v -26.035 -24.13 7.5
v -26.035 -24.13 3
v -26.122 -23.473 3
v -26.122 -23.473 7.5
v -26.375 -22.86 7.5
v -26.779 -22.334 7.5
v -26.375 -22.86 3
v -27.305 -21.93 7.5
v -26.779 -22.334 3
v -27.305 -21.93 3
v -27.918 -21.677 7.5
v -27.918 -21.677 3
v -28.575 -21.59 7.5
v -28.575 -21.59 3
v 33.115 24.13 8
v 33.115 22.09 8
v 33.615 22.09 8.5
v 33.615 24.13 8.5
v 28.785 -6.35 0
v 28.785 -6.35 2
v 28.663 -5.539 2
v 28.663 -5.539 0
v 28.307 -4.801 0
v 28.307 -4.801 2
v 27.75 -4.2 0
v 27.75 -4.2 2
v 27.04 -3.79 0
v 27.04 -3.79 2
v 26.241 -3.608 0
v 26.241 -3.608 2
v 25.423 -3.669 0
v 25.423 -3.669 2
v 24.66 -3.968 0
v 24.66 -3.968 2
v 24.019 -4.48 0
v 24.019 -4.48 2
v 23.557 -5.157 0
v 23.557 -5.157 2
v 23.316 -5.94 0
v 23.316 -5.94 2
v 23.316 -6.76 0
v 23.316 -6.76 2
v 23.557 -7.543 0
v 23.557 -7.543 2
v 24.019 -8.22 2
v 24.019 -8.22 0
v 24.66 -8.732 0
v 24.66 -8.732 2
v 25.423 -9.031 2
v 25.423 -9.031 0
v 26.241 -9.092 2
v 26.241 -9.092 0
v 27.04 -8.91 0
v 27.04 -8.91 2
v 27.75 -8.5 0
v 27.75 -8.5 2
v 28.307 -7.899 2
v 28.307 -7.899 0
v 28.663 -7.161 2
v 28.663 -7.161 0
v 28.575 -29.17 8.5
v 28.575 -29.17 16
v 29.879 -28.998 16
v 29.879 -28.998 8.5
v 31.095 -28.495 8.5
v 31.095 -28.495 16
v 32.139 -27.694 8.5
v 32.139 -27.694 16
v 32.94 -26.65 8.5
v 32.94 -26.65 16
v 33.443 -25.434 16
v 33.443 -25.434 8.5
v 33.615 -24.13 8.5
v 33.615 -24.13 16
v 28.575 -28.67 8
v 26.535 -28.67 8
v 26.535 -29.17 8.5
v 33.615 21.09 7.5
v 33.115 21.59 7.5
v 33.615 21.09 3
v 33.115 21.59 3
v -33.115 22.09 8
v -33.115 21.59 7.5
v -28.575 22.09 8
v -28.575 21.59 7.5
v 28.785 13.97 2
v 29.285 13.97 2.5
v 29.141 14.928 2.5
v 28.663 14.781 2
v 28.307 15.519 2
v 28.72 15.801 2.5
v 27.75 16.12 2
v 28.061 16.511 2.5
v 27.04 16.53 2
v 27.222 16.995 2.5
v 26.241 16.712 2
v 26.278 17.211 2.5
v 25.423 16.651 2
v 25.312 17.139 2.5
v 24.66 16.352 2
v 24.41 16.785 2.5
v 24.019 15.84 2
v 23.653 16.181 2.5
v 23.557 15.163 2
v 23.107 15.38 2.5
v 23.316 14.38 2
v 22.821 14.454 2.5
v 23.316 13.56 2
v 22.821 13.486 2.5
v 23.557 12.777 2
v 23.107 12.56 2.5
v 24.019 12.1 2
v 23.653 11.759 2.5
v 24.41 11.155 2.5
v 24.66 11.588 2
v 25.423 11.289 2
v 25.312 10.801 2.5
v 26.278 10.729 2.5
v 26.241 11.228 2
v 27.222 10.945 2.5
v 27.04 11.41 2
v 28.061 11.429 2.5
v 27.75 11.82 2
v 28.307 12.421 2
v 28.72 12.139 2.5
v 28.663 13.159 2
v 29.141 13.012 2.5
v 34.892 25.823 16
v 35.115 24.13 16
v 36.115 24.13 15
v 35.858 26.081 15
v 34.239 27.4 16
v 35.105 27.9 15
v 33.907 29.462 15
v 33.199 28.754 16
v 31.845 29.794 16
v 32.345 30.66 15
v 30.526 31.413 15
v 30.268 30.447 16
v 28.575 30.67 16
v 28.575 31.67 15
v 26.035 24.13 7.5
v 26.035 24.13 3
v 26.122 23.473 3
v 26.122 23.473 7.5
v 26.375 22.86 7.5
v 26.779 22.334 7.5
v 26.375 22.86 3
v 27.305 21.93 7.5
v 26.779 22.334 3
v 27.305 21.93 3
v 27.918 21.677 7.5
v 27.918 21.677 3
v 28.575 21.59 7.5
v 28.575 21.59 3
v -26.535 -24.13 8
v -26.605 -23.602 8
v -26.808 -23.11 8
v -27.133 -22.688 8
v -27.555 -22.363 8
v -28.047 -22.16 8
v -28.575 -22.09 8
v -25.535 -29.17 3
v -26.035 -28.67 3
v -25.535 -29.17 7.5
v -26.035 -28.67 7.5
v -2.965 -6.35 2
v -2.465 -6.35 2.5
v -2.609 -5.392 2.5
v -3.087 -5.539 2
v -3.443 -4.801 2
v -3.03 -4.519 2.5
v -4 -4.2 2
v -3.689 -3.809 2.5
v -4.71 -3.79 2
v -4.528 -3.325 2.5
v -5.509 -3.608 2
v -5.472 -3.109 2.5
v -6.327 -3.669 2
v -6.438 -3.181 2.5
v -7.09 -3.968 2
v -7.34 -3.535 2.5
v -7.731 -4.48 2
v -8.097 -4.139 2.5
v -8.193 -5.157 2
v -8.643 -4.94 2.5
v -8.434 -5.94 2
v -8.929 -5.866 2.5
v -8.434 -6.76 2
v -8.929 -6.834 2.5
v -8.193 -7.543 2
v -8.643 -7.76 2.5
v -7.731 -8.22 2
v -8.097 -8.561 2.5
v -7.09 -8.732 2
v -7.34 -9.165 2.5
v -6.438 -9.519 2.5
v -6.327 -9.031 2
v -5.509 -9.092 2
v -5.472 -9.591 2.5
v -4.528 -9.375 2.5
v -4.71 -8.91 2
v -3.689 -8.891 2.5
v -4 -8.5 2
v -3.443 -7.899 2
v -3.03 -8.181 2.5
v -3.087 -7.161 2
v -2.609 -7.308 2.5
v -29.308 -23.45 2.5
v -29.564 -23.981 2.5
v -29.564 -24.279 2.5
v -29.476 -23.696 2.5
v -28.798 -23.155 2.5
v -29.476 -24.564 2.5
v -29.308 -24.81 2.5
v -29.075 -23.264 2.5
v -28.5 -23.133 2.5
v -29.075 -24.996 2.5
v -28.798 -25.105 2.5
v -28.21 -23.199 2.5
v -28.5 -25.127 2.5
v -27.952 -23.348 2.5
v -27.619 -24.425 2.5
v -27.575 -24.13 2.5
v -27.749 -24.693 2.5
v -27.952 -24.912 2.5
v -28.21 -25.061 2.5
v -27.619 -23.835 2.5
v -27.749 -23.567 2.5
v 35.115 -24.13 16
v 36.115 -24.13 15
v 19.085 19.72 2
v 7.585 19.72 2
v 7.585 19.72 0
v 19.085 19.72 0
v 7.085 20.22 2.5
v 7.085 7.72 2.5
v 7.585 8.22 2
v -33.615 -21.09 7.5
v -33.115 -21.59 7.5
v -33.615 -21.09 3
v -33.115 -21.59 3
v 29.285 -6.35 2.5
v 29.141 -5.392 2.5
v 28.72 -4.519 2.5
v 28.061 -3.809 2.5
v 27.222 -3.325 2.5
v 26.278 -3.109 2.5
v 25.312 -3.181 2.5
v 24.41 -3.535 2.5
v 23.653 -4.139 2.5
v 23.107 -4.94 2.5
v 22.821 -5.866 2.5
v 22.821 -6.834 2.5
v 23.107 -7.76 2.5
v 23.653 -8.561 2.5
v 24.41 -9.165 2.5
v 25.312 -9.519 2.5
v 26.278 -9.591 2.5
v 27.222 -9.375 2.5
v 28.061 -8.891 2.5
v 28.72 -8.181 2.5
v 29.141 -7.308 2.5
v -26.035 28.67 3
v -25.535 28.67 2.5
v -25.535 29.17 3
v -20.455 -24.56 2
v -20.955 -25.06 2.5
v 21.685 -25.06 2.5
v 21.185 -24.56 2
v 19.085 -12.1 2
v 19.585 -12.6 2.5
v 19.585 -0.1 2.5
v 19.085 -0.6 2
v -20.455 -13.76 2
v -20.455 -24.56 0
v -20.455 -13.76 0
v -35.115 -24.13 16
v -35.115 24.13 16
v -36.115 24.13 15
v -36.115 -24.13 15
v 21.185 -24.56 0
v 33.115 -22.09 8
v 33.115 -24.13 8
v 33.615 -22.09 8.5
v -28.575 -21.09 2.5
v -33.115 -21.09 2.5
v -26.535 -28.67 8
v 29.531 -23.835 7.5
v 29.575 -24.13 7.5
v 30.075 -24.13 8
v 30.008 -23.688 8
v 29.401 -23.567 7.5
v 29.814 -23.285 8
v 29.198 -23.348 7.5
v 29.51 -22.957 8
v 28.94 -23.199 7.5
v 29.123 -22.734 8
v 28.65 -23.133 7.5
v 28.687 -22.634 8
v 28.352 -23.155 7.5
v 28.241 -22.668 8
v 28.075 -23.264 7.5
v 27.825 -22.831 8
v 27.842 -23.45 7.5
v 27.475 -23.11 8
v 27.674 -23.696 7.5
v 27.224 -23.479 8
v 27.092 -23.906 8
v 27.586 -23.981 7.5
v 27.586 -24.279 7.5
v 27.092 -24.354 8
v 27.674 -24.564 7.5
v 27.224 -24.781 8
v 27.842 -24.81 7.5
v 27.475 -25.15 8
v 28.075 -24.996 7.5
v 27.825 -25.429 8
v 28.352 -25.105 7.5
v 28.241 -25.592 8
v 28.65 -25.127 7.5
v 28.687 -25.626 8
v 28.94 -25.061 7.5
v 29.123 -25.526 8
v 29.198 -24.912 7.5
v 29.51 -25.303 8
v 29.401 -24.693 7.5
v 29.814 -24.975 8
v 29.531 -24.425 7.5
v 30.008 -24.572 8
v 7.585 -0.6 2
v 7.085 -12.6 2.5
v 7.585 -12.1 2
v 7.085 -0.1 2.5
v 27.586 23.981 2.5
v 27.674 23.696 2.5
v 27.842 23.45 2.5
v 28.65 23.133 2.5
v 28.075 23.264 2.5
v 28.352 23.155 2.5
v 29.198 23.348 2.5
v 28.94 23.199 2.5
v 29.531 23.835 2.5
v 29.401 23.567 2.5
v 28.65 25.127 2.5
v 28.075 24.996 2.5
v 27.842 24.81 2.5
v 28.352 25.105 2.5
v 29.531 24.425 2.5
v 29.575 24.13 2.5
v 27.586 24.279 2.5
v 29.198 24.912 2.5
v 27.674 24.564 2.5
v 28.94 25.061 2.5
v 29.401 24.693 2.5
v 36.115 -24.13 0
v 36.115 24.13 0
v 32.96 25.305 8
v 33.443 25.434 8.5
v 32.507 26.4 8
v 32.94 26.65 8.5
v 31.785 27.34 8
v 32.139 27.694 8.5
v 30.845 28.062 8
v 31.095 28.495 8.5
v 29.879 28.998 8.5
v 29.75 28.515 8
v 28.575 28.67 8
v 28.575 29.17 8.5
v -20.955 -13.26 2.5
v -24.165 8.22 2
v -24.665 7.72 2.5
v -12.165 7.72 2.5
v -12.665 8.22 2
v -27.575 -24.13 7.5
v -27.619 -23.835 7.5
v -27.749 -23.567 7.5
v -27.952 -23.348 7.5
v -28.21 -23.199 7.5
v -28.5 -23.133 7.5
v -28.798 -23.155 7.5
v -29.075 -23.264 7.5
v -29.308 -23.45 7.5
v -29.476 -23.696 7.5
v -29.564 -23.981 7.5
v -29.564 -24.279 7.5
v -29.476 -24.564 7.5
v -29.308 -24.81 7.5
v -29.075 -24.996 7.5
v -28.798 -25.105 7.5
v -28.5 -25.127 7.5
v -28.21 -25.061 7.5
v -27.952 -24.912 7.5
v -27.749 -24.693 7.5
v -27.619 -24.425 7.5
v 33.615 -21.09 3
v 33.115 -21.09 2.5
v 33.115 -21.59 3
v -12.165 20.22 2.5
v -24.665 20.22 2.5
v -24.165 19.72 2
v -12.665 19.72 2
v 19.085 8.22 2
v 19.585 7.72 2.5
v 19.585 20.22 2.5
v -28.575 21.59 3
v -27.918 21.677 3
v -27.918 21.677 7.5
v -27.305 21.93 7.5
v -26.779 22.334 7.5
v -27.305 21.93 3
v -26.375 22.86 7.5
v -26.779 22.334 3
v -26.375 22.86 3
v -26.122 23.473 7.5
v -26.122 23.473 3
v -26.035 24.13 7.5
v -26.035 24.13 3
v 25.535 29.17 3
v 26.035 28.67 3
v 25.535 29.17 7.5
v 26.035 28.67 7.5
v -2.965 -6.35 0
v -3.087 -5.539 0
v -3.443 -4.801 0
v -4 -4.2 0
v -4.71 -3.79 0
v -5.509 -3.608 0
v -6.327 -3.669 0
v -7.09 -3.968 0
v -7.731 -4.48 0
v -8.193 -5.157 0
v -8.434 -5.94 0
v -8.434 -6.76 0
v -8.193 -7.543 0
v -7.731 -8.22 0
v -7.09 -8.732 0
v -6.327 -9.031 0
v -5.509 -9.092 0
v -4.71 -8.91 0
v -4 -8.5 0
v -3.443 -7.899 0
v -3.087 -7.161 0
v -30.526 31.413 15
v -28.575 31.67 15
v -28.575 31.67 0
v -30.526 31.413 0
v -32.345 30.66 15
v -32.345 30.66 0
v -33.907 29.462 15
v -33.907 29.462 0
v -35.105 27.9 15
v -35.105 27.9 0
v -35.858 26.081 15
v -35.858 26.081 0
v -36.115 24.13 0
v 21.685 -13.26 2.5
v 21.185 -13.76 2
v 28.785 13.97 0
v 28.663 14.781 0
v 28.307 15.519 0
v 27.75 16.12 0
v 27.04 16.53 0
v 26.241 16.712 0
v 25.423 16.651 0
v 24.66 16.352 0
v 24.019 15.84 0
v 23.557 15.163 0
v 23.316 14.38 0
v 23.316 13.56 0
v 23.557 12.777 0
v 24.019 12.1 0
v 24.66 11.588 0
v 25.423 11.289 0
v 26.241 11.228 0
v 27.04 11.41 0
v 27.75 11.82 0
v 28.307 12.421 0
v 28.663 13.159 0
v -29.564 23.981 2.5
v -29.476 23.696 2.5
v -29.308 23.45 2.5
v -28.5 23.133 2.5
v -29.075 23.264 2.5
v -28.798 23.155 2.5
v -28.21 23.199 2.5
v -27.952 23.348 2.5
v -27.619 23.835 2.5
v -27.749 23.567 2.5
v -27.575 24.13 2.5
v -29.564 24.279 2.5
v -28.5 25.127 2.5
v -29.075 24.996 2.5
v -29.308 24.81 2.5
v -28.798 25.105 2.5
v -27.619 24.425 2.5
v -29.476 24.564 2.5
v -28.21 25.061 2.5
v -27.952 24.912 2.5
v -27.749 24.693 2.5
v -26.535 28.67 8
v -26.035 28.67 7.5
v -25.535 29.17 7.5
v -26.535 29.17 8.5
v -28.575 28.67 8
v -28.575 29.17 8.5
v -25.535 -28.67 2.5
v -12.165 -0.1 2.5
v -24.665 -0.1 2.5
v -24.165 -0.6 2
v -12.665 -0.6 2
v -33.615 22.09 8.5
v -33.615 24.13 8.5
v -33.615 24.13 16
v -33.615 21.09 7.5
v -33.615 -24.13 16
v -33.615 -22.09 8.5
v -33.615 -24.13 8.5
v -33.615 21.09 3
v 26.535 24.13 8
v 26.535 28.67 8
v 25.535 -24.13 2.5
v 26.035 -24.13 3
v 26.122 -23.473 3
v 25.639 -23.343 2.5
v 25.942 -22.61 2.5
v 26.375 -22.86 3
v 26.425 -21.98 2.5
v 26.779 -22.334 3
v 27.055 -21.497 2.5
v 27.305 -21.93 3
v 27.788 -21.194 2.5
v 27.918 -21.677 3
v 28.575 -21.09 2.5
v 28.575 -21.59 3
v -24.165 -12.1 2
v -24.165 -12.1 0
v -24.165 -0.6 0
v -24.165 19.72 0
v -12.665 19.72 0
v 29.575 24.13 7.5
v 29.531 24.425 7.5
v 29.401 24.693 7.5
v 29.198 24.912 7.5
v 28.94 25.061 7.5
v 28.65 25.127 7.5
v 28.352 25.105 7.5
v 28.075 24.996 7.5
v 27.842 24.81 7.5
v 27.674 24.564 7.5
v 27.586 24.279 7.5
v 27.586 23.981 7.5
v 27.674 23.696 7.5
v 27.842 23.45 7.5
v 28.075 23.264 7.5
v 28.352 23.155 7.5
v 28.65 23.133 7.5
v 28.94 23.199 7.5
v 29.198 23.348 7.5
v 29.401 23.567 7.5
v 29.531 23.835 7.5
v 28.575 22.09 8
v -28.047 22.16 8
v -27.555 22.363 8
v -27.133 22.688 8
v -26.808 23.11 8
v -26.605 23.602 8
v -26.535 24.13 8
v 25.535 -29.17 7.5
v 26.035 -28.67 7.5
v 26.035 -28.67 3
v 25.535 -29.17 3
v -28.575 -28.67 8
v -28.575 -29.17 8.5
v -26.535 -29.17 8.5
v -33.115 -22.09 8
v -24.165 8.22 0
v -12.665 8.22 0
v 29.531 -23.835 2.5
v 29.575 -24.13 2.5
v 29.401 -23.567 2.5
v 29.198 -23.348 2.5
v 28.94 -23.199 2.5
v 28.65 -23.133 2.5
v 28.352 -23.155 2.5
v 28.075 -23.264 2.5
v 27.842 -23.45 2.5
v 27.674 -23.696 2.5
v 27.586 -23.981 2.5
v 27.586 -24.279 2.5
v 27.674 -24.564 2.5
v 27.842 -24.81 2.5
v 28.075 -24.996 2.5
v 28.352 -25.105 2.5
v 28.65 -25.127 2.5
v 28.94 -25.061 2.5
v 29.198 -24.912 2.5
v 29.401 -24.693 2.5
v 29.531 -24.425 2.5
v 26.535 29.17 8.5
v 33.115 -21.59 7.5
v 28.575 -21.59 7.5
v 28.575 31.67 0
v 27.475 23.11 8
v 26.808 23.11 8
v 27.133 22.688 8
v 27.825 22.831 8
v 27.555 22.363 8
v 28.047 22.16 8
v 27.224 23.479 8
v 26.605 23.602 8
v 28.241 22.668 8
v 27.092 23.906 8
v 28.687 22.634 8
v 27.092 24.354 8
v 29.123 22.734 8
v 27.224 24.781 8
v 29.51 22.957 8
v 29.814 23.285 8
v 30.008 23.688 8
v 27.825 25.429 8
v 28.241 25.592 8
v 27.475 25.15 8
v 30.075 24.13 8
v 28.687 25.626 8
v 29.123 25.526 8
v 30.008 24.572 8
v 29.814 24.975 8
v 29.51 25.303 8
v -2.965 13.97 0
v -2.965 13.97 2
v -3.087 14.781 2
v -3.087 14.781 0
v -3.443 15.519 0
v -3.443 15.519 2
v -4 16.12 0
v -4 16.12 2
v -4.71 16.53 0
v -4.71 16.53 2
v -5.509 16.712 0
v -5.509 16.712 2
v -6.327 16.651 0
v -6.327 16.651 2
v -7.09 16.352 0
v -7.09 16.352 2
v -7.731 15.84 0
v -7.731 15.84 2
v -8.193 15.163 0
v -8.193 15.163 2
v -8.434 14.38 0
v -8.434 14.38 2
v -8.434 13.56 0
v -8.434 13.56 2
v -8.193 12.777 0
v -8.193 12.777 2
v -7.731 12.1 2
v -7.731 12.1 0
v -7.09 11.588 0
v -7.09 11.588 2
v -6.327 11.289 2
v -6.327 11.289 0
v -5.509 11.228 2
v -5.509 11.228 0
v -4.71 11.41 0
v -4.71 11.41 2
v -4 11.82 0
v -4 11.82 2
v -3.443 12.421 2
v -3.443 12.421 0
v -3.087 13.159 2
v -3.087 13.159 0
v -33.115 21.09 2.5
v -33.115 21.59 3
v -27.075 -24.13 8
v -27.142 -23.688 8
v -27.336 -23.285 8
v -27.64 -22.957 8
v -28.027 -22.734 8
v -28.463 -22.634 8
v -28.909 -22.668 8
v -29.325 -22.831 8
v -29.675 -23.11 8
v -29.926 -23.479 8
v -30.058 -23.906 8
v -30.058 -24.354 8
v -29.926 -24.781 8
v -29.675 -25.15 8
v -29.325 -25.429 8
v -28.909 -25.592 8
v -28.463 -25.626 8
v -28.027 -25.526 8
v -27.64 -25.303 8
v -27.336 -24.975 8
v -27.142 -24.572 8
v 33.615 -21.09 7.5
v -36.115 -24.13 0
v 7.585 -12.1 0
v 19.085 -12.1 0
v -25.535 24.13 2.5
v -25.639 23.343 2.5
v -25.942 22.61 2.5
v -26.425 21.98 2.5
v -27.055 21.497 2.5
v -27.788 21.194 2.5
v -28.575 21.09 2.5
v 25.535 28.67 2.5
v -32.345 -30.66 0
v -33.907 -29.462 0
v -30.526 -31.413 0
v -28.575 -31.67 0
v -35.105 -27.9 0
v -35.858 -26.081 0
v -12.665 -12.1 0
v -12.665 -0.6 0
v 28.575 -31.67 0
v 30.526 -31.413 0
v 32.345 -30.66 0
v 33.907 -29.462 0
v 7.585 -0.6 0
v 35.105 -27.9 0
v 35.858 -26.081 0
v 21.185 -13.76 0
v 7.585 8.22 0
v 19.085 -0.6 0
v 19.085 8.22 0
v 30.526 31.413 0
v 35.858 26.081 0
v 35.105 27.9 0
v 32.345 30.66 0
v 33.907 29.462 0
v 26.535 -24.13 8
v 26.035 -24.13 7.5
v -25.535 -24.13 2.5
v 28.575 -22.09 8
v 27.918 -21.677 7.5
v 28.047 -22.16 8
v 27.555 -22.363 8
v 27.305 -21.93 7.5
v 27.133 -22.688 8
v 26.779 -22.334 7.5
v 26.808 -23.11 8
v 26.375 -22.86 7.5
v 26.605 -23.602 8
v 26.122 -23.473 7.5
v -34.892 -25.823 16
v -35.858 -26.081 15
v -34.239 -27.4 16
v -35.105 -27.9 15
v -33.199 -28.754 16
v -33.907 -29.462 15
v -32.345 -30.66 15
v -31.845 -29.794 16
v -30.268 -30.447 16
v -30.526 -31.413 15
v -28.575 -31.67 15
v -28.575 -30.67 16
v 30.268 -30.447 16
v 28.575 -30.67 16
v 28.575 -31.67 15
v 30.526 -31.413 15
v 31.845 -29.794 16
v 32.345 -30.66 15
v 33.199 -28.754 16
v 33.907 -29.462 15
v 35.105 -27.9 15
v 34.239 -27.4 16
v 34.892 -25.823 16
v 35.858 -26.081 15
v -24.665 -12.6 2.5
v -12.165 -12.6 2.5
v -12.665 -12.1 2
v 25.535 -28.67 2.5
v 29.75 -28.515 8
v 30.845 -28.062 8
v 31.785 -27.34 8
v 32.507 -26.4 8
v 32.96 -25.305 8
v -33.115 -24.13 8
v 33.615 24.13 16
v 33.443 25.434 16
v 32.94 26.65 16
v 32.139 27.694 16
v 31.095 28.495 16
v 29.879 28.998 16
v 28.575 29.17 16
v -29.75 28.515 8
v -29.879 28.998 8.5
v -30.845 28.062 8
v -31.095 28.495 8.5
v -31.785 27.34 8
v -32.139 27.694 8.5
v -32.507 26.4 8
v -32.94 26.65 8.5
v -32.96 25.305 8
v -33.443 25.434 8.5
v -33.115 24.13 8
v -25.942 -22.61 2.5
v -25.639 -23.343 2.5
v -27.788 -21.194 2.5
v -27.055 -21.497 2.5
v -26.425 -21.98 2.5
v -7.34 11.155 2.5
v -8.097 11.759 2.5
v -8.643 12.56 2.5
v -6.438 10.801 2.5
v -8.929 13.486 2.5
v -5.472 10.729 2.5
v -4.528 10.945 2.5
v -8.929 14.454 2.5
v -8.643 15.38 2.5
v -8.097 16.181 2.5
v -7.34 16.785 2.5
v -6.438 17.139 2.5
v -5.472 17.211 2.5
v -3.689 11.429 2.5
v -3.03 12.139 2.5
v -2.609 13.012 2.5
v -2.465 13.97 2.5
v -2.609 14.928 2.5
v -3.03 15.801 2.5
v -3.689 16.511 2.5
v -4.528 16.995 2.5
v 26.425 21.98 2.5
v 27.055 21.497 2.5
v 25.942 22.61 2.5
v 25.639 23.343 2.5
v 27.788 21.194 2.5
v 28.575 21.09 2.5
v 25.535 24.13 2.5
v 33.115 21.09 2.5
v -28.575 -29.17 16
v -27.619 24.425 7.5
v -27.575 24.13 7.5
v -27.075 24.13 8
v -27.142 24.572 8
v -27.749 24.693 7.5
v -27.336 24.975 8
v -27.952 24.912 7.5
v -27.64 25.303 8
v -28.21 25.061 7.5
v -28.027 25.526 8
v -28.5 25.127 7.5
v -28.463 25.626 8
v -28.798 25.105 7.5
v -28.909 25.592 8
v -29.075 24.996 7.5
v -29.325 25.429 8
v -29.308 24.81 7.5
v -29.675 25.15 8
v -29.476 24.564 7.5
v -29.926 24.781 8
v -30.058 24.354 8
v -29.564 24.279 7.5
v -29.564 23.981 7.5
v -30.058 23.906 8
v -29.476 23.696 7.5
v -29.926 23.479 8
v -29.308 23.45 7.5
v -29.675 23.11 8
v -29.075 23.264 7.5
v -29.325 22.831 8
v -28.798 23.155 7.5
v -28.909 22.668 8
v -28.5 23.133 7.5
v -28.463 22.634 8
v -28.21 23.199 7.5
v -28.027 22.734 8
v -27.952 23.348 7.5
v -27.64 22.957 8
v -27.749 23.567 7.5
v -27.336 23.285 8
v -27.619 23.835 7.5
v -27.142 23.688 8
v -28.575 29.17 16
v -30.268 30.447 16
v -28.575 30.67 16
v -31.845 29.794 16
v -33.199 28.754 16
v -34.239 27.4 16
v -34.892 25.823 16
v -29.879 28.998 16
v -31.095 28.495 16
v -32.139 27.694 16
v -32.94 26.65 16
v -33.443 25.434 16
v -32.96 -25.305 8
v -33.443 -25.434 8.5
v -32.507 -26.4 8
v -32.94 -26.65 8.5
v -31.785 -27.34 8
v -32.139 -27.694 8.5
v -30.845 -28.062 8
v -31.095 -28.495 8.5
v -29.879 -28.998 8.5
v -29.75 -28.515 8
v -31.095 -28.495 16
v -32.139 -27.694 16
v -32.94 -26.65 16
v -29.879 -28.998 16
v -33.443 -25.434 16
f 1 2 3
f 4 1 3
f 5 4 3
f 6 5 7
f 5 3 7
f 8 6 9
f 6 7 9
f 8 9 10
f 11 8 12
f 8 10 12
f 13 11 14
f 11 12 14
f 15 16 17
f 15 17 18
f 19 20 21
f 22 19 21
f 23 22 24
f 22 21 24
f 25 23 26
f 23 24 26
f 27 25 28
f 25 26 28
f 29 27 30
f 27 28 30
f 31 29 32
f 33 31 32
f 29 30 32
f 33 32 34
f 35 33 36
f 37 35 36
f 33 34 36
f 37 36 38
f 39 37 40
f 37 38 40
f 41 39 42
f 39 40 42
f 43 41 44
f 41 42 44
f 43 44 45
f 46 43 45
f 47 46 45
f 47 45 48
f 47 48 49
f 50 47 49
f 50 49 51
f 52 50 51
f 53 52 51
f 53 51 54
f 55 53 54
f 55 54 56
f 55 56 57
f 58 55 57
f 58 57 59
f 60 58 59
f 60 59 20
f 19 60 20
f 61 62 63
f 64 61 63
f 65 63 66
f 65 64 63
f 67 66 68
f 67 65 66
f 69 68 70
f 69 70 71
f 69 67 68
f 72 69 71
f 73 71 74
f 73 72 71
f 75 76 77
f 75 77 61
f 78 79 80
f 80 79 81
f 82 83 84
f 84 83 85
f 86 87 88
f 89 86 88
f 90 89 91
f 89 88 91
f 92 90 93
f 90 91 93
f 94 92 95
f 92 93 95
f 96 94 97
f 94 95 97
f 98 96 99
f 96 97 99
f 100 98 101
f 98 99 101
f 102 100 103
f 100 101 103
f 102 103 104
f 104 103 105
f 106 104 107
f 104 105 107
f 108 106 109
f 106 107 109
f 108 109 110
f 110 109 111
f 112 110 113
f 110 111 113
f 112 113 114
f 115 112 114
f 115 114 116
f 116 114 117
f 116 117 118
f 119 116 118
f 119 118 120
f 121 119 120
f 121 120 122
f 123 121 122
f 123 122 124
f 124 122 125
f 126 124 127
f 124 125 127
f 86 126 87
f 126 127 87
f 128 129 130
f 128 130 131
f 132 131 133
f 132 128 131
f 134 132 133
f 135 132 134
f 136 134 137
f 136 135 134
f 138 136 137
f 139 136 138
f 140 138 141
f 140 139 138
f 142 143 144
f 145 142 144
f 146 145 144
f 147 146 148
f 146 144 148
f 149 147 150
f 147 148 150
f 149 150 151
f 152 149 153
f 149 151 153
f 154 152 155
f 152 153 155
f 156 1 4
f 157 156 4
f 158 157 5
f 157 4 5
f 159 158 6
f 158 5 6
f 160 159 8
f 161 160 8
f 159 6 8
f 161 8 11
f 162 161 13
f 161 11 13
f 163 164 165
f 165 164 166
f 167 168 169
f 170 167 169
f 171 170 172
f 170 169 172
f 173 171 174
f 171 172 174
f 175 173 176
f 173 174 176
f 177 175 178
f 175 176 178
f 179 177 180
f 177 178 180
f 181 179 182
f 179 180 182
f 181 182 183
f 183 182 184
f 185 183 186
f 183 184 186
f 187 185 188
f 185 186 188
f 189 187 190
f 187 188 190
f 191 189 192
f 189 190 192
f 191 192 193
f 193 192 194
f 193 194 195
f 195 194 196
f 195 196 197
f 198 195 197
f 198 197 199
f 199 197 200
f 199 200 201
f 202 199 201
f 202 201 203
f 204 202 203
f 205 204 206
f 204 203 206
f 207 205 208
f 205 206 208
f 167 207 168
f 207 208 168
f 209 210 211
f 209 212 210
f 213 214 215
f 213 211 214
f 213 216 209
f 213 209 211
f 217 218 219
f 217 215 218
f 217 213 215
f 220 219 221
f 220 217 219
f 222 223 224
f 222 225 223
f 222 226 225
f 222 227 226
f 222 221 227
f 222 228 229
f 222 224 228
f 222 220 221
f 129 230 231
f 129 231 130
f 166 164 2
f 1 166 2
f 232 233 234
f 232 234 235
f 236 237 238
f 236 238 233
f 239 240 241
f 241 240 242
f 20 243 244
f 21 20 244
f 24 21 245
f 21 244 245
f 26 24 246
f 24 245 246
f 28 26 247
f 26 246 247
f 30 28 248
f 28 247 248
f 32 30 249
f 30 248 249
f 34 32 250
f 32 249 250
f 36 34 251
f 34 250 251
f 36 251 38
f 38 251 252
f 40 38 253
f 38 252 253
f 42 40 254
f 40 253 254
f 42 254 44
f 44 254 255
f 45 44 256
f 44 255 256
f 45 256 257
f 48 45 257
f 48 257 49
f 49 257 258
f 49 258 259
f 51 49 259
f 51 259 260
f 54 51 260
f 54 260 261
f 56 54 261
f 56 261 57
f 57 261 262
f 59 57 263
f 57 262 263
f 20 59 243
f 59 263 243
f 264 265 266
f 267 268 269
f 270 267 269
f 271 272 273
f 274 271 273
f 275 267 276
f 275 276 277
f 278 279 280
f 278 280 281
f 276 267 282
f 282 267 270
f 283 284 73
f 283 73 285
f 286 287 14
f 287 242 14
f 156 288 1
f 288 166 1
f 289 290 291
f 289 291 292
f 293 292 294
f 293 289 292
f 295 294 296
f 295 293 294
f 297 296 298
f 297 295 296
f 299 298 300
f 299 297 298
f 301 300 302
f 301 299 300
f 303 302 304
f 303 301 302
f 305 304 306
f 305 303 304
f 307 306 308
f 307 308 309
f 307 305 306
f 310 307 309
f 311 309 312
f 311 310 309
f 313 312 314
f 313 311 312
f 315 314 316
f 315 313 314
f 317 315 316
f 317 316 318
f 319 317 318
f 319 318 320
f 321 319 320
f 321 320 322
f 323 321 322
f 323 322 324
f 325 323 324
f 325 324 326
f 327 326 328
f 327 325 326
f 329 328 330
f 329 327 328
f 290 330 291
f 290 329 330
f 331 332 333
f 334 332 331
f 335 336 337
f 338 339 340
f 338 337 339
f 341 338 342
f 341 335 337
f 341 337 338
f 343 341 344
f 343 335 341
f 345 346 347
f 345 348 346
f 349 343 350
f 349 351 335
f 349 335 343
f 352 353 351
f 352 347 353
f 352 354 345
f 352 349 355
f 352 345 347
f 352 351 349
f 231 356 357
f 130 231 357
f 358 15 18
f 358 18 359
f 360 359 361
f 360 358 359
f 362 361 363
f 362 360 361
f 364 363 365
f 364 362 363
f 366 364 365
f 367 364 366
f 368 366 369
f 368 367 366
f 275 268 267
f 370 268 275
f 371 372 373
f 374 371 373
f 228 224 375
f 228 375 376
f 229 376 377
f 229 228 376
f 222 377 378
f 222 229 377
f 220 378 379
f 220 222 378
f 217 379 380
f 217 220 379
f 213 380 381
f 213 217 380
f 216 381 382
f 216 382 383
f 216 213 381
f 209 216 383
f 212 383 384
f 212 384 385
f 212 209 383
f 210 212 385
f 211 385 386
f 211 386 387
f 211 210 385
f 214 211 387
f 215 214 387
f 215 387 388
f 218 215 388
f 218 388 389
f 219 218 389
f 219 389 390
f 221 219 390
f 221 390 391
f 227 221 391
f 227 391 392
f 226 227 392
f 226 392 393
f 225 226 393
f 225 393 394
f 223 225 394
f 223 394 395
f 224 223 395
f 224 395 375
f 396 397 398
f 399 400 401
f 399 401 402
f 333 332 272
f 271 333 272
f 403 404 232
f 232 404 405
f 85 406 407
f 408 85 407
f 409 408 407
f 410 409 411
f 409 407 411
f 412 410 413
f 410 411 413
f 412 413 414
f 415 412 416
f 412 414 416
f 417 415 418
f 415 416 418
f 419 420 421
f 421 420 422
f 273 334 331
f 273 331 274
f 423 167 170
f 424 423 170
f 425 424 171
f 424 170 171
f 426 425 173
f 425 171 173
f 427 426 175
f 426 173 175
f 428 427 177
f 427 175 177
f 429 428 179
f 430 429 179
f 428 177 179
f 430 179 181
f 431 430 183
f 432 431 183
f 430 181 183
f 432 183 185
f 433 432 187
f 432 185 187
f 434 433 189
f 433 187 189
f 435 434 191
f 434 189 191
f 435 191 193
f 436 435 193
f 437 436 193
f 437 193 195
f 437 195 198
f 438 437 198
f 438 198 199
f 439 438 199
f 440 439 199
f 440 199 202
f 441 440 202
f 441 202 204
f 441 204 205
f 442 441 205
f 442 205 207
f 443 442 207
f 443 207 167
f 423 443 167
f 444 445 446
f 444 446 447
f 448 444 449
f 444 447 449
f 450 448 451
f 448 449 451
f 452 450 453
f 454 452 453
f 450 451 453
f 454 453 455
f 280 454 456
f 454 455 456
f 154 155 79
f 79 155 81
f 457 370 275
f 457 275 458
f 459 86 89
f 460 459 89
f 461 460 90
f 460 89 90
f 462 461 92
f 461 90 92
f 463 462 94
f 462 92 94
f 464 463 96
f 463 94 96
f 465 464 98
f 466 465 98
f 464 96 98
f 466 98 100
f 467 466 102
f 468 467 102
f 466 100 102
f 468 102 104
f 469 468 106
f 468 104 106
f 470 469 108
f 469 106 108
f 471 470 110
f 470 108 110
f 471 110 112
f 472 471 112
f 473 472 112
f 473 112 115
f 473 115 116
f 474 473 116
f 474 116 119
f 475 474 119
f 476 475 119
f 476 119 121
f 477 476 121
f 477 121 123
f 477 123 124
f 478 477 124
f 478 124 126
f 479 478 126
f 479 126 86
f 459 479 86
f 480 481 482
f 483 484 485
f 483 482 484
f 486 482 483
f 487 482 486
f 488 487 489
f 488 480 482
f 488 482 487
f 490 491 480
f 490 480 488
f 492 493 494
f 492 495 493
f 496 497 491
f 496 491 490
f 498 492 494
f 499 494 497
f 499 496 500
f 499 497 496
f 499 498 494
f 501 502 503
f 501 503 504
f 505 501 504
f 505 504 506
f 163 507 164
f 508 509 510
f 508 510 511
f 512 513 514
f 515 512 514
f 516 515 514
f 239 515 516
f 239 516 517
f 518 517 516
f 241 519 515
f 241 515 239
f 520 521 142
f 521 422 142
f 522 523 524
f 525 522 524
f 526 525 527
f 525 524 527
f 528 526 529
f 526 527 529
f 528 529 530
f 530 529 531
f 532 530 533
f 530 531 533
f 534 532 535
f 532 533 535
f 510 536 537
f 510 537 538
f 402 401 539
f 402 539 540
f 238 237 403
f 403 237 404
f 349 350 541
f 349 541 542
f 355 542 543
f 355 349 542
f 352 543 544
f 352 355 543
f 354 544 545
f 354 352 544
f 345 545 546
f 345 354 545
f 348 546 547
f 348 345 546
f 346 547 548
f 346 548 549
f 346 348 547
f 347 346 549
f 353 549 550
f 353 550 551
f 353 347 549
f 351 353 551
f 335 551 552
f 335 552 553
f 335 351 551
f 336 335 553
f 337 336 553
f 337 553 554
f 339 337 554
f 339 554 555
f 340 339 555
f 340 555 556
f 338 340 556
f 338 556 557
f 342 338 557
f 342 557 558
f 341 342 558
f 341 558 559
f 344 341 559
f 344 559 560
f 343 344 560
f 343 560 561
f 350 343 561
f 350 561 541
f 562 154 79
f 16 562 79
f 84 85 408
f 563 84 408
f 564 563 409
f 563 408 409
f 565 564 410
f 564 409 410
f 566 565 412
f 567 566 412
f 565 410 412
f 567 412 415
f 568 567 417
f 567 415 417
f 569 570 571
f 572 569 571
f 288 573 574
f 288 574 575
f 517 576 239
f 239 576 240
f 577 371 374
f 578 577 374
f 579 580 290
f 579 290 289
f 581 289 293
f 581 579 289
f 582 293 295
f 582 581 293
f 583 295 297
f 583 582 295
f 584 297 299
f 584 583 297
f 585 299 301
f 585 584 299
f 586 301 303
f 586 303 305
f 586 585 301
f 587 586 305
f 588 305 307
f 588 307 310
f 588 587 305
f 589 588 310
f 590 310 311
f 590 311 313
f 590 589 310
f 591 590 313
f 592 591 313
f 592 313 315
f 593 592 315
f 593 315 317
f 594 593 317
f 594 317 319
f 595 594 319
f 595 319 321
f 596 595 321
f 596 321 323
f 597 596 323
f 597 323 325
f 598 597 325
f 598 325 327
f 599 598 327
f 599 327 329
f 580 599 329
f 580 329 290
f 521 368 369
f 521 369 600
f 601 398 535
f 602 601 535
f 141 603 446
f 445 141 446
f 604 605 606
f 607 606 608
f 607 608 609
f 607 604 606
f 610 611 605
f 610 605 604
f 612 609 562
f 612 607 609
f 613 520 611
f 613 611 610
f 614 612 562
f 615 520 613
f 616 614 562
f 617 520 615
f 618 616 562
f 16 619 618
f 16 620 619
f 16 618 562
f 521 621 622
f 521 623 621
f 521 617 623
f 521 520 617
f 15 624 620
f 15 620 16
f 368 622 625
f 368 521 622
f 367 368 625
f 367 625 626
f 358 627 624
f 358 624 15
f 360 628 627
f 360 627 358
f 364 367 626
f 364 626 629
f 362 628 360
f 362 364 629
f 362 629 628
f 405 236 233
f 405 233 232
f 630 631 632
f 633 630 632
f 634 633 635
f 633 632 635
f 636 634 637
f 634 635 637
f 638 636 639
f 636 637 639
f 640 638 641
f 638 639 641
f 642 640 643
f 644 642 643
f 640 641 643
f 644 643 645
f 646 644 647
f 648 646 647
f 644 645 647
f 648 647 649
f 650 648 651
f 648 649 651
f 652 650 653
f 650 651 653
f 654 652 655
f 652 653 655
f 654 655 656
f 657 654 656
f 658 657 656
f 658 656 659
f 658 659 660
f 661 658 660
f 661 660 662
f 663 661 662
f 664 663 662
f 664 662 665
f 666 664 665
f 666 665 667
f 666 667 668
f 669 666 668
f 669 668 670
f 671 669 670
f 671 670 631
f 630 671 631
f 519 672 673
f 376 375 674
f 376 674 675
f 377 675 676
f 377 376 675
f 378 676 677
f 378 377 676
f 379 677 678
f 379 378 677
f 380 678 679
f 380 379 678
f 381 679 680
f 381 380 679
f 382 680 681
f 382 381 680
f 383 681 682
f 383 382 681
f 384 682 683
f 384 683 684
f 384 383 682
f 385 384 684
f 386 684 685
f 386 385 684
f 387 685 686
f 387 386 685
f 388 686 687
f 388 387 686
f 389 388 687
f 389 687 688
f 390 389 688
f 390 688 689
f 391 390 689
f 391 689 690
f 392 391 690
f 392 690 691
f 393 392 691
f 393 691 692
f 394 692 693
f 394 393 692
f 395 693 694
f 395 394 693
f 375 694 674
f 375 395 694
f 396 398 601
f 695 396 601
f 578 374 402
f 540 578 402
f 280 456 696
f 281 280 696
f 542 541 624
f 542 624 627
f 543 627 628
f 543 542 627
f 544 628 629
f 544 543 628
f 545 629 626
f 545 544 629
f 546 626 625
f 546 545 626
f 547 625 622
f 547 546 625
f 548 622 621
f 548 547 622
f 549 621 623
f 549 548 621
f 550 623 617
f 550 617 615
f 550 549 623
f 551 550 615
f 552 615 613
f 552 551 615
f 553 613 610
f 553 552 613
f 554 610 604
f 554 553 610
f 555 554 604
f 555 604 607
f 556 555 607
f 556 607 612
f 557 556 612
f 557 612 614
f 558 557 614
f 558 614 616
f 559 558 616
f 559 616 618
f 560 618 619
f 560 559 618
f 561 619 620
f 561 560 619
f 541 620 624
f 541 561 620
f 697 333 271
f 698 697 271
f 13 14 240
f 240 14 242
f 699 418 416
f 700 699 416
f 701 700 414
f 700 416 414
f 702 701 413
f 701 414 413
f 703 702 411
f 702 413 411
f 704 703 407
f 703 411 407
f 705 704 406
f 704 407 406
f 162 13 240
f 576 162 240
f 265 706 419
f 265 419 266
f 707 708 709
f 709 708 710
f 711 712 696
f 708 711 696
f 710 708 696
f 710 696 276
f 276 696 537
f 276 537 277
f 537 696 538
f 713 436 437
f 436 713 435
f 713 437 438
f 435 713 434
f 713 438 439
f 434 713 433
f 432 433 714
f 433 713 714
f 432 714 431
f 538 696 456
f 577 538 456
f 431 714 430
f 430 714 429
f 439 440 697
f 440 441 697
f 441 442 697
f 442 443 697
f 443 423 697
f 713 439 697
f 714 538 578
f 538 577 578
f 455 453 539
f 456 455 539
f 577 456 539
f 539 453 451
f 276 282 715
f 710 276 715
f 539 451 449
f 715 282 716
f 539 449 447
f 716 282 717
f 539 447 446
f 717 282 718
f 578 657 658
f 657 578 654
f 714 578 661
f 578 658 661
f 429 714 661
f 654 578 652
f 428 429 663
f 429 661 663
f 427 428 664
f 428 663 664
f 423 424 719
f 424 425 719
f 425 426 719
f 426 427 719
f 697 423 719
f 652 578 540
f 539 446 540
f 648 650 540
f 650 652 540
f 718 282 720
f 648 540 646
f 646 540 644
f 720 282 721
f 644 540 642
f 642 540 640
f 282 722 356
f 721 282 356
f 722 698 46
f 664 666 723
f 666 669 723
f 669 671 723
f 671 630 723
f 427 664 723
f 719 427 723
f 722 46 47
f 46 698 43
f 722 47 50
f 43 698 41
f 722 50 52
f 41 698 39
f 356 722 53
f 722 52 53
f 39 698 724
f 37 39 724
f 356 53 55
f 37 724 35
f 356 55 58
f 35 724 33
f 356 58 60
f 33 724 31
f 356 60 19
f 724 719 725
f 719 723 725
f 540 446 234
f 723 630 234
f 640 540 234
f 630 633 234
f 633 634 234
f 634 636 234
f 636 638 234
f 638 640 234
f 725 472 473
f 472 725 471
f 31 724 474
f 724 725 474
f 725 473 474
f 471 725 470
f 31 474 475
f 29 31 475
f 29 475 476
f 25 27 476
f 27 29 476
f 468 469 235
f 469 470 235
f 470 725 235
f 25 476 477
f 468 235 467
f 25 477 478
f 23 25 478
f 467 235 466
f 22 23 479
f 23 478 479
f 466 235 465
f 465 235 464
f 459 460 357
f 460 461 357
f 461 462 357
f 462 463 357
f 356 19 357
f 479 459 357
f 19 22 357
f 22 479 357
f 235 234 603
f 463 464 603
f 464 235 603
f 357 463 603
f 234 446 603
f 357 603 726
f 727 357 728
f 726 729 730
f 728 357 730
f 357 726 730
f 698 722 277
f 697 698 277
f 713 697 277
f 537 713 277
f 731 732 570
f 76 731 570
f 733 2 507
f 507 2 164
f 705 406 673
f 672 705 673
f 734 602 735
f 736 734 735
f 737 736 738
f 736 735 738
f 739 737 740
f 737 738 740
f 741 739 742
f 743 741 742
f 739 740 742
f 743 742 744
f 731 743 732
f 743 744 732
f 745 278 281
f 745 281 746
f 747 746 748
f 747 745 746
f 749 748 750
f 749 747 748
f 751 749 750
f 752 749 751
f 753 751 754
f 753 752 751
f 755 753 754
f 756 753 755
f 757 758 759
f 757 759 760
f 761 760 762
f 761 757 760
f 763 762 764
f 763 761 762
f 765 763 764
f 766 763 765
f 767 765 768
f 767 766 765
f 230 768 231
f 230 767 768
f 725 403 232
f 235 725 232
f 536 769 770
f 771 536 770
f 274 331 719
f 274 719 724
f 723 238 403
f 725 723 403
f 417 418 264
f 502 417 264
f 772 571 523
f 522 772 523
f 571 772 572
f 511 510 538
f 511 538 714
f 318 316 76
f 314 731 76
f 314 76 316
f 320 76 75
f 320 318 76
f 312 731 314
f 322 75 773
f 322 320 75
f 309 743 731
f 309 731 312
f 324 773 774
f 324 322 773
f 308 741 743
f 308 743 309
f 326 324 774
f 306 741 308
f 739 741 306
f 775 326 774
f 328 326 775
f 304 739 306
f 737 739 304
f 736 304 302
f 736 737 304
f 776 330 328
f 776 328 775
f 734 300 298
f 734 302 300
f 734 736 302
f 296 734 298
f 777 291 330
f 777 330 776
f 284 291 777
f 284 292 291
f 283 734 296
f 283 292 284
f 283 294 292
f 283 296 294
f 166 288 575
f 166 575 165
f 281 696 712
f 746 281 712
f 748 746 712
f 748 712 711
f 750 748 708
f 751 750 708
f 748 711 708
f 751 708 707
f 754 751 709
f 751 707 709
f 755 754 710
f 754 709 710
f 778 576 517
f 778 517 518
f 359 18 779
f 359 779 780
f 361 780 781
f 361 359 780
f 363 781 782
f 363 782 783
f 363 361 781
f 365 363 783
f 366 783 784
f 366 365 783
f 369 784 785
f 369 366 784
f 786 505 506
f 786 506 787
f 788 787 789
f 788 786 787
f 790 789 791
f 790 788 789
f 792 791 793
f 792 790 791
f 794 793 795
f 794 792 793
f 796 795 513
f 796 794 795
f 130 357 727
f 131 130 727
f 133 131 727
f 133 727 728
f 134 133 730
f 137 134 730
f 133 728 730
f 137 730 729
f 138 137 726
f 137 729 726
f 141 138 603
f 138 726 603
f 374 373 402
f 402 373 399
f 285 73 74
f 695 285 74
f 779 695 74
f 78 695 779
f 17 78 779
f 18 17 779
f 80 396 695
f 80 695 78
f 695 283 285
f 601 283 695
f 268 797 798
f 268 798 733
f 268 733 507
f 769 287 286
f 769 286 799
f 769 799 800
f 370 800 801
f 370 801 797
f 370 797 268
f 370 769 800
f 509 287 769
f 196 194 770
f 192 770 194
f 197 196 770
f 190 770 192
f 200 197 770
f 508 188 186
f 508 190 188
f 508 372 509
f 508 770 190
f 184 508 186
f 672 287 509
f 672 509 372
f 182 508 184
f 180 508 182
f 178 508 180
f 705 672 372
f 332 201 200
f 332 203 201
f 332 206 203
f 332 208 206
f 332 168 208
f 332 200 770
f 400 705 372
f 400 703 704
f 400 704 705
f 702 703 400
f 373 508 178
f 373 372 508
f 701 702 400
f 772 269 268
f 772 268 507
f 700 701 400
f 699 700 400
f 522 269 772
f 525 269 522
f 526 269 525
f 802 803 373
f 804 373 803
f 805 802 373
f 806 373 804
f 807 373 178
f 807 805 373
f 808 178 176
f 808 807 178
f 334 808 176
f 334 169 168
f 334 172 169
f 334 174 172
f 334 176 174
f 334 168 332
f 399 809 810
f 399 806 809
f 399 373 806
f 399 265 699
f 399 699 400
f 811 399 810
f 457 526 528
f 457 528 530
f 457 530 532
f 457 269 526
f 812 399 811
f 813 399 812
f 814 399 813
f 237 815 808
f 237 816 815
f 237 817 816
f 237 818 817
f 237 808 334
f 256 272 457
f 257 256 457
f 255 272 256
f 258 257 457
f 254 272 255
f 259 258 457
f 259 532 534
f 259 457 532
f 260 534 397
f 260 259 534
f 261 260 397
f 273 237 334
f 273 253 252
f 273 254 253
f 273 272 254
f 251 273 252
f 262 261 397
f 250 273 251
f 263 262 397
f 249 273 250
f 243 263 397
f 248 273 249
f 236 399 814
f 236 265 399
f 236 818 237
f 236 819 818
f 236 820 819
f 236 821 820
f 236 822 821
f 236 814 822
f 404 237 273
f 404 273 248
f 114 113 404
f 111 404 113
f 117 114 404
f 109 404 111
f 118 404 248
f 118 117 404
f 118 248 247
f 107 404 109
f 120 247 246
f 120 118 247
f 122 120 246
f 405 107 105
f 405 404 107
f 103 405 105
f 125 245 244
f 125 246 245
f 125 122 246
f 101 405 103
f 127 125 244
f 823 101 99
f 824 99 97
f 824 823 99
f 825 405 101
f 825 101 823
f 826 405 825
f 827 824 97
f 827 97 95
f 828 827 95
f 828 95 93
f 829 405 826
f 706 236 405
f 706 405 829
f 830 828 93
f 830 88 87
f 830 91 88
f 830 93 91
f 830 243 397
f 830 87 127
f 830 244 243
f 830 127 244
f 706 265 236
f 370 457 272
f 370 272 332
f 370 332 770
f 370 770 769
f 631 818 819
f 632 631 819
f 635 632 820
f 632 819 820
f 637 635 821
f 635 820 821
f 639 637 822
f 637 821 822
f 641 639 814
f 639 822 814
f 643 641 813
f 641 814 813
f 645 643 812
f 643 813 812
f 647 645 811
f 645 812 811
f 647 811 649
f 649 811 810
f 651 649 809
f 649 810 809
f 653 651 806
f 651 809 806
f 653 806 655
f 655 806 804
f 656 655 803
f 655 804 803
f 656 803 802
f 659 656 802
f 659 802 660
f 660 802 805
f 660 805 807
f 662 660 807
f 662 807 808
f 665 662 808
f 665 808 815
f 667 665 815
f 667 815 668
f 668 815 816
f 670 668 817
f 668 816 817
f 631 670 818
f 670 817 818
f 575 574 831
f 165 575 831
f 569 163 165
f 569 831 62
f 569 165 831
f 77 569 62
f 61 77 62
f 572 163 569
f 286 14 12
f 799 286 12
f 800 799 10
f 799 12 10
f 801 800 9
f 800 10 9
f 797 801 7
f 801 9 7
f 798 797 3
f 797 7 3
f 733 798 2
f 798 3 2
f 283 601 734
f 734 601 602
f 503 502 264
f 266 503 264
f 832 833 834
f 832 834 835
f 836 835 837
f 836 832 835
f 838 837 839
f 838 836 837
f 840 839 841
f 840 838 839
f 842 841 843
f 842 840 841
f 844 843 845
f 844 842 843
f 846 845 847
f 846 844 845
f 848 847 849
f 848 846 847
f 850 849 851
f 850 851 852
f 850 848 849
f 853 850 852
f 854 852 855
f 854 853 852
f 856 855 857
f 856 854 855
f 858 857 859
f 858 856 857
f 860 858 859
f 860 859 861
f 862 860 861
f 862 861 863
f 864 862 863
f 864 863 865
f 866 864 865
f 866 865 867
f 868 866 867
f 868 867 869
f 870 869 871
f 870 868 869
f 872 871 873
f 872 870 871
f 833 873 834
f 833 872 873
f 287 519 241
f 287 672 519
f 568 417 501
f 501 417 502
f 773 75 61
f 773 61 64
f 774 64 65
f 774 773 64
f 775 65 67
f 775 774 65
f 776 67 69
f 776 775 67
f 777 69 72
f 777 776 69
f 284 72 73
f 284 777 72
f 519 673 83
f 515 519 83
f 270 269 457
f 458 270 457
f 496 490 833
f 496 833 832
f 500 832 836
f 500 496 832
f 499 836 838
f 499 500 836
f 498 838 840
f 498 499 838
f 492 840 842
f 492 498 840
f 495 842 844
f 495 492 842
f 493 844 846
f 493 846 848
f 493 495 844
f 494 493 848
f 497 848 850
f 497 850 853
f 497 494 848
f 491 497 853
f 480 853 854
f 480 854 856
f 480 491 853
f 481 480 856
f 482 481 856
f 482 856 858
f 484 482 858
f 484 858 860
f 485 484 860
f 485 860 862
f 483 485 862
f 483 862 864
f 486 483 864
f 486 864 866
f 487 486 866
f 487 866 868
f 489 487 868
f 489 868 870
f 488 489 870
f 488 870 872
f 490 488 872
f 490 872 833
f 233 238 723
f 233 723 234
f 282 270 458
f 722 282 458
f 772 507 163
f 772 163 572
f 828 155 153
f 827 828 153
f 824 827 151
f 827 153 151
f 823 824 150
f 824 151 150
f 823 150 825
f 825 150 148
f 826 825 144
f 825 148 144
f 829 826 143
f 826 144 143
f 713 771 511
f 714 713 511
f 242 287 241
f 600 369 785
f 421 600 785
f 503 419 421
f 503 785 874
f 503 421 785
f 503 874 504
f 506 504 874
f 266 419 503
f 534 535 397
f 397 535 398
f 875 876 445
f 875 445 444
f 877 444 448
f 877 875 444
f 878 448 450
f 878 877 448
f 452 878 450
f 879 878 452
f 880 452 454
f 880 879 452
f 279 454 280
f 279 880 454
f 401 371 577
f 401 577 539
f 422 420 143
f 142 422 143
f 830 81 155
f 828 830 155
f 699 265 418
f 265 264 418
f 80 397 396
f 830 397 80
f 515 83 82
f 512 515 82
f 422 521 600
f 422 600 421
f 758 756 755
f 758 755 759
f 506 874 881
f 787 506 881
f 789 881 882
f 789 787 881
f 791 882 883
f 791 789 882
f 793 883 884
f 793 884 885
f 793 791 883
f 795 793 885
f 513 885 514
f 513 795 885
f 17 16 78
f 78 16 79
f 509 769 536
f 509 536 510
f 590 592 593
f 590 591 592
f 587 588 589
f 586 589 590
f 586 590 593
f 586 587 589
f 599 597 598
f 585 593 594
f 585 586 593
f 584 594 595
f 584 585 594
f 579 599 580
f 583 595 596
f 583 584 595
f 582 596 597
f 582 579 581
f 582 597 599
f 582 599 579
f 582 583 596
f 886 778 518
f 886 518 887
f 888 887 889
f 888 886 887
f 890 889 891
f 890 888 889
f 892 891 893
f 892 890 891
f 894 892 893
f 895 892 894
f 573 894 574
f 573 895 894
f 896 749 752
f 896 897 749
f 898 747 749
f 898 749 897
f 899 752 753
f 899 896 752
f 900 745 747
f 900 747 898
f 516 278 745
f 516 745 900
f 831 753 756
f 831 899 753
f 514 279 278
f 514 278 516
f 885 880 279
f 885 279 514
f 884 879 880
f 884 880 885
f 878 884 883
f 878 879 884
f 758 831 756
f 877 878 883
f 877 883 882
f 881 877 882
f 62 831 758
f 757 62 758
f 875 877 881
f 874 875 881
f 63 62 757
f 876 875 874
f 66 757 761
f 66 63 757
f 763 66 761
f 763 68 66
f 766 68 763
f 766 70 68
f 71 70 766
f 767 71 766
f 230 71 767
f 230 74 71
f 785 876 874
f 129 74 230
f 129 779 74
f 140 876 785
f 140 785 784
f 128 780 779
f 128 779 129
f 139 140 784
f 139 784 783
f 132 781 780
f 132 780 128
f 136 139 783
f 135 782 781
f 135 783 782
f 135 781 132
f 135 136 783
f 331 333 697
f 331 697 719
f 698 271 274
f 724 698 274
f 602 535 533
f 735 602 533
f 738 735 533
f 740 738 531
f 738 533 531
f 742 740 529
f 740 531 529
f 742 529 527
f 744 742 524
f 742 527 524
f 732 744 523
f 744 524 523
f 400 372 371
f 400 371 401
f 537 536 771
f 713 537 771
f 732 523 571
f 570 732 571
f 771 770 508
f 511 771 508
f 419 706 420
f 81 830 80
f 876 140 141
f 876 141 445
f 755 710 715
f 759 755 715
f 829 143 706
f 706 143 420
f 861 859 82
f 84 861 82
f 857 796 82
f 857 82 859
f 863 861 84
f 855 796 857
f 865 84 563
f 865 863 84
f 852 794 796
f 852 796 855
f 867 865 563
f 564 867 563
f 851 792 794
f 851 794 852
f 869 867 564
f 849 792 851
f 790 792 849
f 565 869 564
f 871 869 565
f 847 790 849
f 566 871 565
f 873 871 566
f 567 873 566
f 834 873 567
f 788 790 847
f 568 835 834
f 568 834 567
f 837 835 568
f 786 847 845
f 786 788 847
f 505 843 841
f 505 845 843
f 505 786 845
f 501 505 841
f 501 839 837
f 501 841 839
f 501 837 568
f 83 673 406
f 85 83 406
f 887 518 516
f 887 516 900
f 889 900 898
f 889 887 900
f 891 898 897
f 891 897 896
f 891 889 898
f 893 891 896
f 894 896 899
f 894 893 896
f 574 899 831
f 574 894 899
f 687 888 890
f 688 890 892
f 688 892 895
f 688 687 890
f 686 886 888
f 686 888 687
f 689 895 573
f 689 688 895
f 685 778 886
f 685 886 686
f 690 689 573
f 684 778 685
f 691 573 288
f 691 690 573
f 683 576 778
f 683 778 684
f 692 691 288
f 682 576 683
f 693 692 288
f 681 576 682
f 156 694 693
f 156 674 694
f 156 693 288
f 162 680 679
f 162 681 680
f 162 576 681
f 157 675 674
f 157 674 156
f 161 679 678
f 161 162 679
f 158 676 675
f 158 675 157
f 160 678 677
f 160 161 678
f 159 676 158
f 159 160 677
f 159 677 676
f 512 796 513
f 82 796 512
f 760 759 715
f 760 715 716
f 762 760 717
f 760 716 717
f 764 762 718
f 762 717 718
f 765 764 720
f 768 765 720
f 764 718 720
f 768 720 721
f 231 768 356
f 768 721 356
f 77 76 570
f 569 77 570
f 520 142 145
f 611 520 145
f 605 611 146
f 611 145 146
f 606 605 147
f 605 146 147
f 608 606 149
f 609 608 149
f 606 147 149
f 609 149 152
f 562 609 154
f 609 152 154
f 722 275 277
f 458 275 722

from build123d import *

# Parameters (mm, degrees)
F0_R     = 1
F1_DEPTH = 16
F2_T     = -2.5
F3_DEPTH = 8
F4_W     = 41.64
F4_H     = 10.8
F4_W_2   = 11.5
F4_H_2   = 11.5
F4_R     = 2.75
F5_DEPTH = 2.501
F6_SIZE  = 1
F7_SIZE  = 0.5


with BuildPart() as f1:
    # F0 (on Top) → F1 (new body)
    with BuildSketch(Plane.XY):
        with BuildLine():
            ThreePointArc((-36.115, -24.13), (-33.9065851301, -29.4615851301), (-28.575, -31.67))
            Line((-28.575, -31.67), (-26.035, -31.67))
            Line((-26.035, -31.67), (-26.035, -24.13))
            ThreePointArc((-26.035, -24.13), (-26.7789487758, -22.3339487758), (-28.575, -21.59))
            Line((-28.575, -21.59), (-36.115, -21.59))
            Line((-36.115, -21.59), (-36.115, -24.13))
        make_face()
        with Locations((-28.575, -24.13)):
            Circle(F0_R, mode=Mode.SUBTRACT)
        with BuildLine():
            Line((-26.035, -24.13), (-26.035, -31.67))
            Line((-26.035, -31.67), (26.035, -31.67))
            Line((26.035, -31.67), (26.035, -24.13))
            ThreePointArc((26.035, -24.13), (26.7789487758, -22.3339487758), (28.575, -21.59))
            Line((28.575, -21.59), (36.115, -21.59))
            Line((36.115, -21.59), (36.115, 21.59))
            Line((36.115, 21.59), (28.575, 21.59))
            ThreePointArc((28.575, 21.59), (26.7789487758, 22.3339487758), (26.035, 24.13))
            Line((26.035, 24.13), (26.035, 31.67))
            Line((26.035, 31.67), (-26.035, 31.67))
            Line((-26.035, 31.67), (-26.035, 24.13))
            ThreePointArc((-26.035, 24.13), (-26.7789487758, 22.3339487758), (-28.575, 21.59))
            Line((-28.575, 21.59), (-36.115, 21.59))
            Line((-36.115, 21.59), (-36.115, -21.59))
            Line((-36.115, -21.59), (-28.575, -21.59))
            ThreePointArc((-28.575, -21.59), (-26.7789487758, -22.3339487758), (-26.035, -24.13))
        make_face()
        with BuildLine():
            Line((-36.115, 24.13), (-36.115, 21.59))
            Line((-36.115, 21.59), (-28.575, 21.59))
            ThreePointArc((-28.575, 21.59), (-26.7789487758, 22.3339487758), (-26.035, 24.13))
            Line((-26.035, 24.13), (-26.035, 31.67))
            Line((-26.035, 31.67), (-28.575, 31.67))
            ThreePointArc((-28.575, 31.67), (-33.9065851301, 29.4615851301), (-36.115, 24.13))
        make_face()
        with Locations((-28.575, 24.13)):
            Circle(F0_R, mode=Mode.SUBTRACT)
        with BuildLine():
            Line((26.035, -24.13), (26.035, -31.67))
            Line((26.035, -31.67), (28.575, -31.67))
            ThreePointArc((28.575, -31.67), (33.9065851301, -29.4615851301), (36.115, -24.13))
            Line((36.115, -24.13), (36.115, -21.59))
            Line((36.115, -21.59), (28.575, -21.59))
            ThreePointArc((28.575, -21.59), (26.7789487758, -22.3339487758), (26.035, -24.13))
        make_face()
        with Locations((28.575, -24.13)):
            Circle(F0_R, mode=Mode.SUBTRACT)
        with BuildLine():
            Line((28.575, 21.59), (36.115, 21.59))
            Line((36.115, 21.59), (36.115, 24.13))
            ThreePointArc((36.115, 24.13), (33.9065851301, 29.4615851301), (28.575, 31.67))
            Line((28.575, 31.67), (26.035, 31.67))
            Line((26.035, 31.67), (26.035, 24.13))
            ThreePointArc((26.035, 24.13), (26.7789487758, 22.3339487758), (28.575, 21.59))
        make_face()
        with Locations((28.575, 24.13)):
            Circle(F0_R, mode=Mode.SUBTRACT)
        with Locations((28.575, -24.13)):
            Circle(F0_R)
        with Locations((28.575, 24.13)):
            Circle(F0_R)
        with Locations((-28.575, -24.13)):
            Circle(F0_R)
        with Locations((-28.575, 24.13)):
            Circle(F0_R)
    extrude(amount=F1_DEPTH)

    # F2
    f2_openings = [f1.faces().sort_by_distance(p)[0] for p in [
        (0, 0, 16),
    ]]
    offset(amount=F2_T, openings=f2_openings)

    # F0 (on Top) → F3 (join)
    with BuildSketch(Plane.XY):
        with BuildLine():
            Line((26.035, -24.13), (26.035, -31.67))
            Line((26.035, -31.67), (28.575, -31.67))
            ThreePointArc((28.575, -31.67), (33.9065851301, -29.4615851301), (36.115, -24.13))
            Line((36.115, -24.13), (36.115, -21.59))
            Line((36.115, -21.59), (28.575, -21.59))
            ThreePointArc((28.575, -21.59), (26.7789487758, -22.3339487758), (26.035, -24.13))
        make_face()
        with Locations((28.575, -24.13)):
            Circle(F0_R, mode=Mode.SUBTRACT)
        with BuildLine():
            Line((28.575, 21.59), (36.115, 21.59))
            Line((36.115, 21.59), (36.115, 24.13))
            ThreePointArc((36.115, 24.13), (33.9065851301, 29.4615851301), (28.575, 31.67))
            Line((28.575, 31.67), (26.035, 31.67))
            Line((26.035, 31.67), (26.035, 24.13))
            ThreePointArc((26.035, 24.13), (26.7789487758, 22.3339487758), (28.575, 21.59))
        make_face()
        with Locations((28.575, 24.13)):
            Circle(F0_R, mode=Mode.SUBTRACT)
        with BuildLine():
            Line((-36.115, 24.13), (-36.115, 21.59))
            Line((-36.115, 21.59), (-28.575, 21.59))
            ThreePointArc((-28.575, 21.59), (-26.7789487758, 22.3339487758), (-26.035, 24.13))
            Line((-26.035, 24.13), (-26.035, 31.67))
            Line((-26.035, 31.67), (-28.575, 31.67))
            ThreePointArc((-28.575, 31.67), (-33.9065851301, 29.4615851301), (-36.115, 24.13))
        make_face()
        with Locations((-28.575, 24.13)):
            Circle(F0_R, mode=Mode.SUBTRACT)
        with BuildLine():
            ThreePointArc((-36.115, -24.13), (-33.9065851301, -29.4615851301), (-28.575, -31.67))
            Line((-28.575, -31.67), (-26.035, -31.67))
            Line((-26.035, -31.67), (-26.035, -24.13))
            ThreePointArc((-26.035, -24.13), (-26.7789487758, -22.3339487758), (-28.575, -21.59))
            Line((-28.575, -21.59), (-36.115, -21.59))
            Line((-36.115, -21.59), (-36.115, -24.13))
        make_face()
        with Locations((-28.575, -24.13)):
            Circle(F0_R, mode=Mode.SUBTRACT)
    extrude(amount=F3_DEPTH)

    # F4 (on face) → F5 (cut, through all)
    with BuildSketch(Plane.XY.offset(2.5)):
        with Locations((0.365, -19.16)):
            Rectangle(F4_W, F4_H)
        with Locations((-18.415, 13.97)):
            Rectangle(F4_W_2, F4_H_2)
        with Locations((-5.715, 13.97)):
            Circle(F4_R)
        with Locations((-18.415, -6.35)):
            Rectangle(F4_W_2, F4_H_2)
        with Locations((-5.715, -6.35)):
            Circle(F4_R)
        with Locations((13.335, 13.97)):
            Rectangle(F4_W_2, F4_H_2)
        with Locations((26.035, 13.97)):
            Circle(F4_R)
        with Locations((13.335, -6.35)):
            Rectangle(F4_W_2, F4_H_2)
        with Locations((26.035, -6.35)):
            Circle(F4_R)
    extrude(amount=-F5_DEPTH, mode=Mode.SUBTRACT)

    # F6
    f6_edges = [f1.edges().sort_by_distance(p)[0] for p in [
        (-36.115, 0, 16),
        (-33.906585, -29.461585, 16),
        (0, -31.67, 16),
        (33.906585, -29.461585, 16),
        (36.115, 0, 16),
        (33.906585, 29.461585, 16),
        (0, 31.67, 16),
        (-33.906585, 29.461585, 16),
    ]]
    chamfer(f6_edges, length=F6_SIZE)

    # F7
    f7_edges = [f1.edges().sort_by_distance(p)[0] for p in [
        (-33.615, 22.86, 8),
        (-32.138818, 27.693818, 8),
        (-27.305, 29.17, 8),
        (-26.035, 26.65, 8),
        (-26.778949, 22.333949, 8),
        (-31.095, 21.59, 8),
        (-29.575, 24.13, 8),
        (26.778949, 22.333949, 8),
        (26.035, 26.65, 8),
        (27.305, 29.17, 8),
        (32.138818, 27.693818, 8),
        (33.615, 22.86, 8),
        (31.095, 21.59, 8),
        (27.575, 24.13, 8),
        (26.778949, -22.333949, 8),
        (31.095, -21.59, 8),
        (33.615, -22.86, 8),
        (32.138818, -27.693818, 8),
        (27.305, -29.17, 8),
        (26.035, -26.65, 8),
        (27.575, -24.13, 8),
        (-31.095, -21.59, 8),
        (-26.778949, -22.333949, 8),
        (-26.035, -26.65, 8),
        (-27.305, -29.17, 8),
        (-32.138818, -27.693818, 8),
        (-33.615, -22.86, 8),
        (-29.575, -24.13, 8),
        (-26.035, -26.65, 2.5),
        (-26.778949, -22.333949, 2.5),
        (0, -29.17, 2.5),
        (-31.095, -21.59, 2.5),
        (26.035, -26.65, 2.5),
        (-33.615, 0, 2.5),
        (26.778949, -22.333949, 2.5),
        (-31.095, 21.59, 2.5),
        (31.095, -21.59, 2.5),
        (-26.778949, 22.333949, 2.5),
        (33.615, 0, 2.5),
        (-26.035, 26.65, 2.5),
        (31.095, 21.59, 2.5),
        (0, 29.17, 2.5),
        (26.778949, 22.333949, 2.5),
        (26.035, 26.65, 2.5),
        (0.365, -13.76, 2.5),
        (-20.455, -19.16, 2.5),
        (0.365, -24.56, 2.5),
        (21.185, -19.16, 2.5),
        (-12.665, -6.35, 2.5),
        (-18.415, -0.6, 2.5),
        (-24.165, -6.35, 2.5),
        (-18.415, -12.1, 2.5),
        (-8.465, -6.35, 2.5),
        (13.335, -12.1, 2.5),
        (19.085, -6.35, 2.5),
        (13.335, -0.6, 2.5),
        (7.585, -6.35, 2.5),
        (23.285, -6.35, 2.5),
        (-12.665, 13.97, 2.5),
        (-18.415, 19.72, 2.5),
        (-24.165, 13.97, 2.5),
        (-18.415, 8.22, 2.5),
        (-8.465, 13.97, 2.5),
        (13.335, 8.22, 2.5),
        (19.085, 13.97, 2.5),
        (13.335, 19.72, 2.5),
        (7.585, 13.97, 2.5),
        (23.285, 13.97, 2.5),
        (-33.615, 21.59, 5.25),
        (-33.615, -21.59, 5.25),
        (26.035, 29.17, 5.25),
        (-26.035, 29.17, 5.25),
        (33.615, -21.59, 5.25),
        (33.615, 21.59, 5.25),
        (-26.035, -29.17, 5.25),
        (26.035, -29.17, 5.25),
    ]]
    chamfer(f7_edges, length=F7_SIZE)


solid = f1.part
